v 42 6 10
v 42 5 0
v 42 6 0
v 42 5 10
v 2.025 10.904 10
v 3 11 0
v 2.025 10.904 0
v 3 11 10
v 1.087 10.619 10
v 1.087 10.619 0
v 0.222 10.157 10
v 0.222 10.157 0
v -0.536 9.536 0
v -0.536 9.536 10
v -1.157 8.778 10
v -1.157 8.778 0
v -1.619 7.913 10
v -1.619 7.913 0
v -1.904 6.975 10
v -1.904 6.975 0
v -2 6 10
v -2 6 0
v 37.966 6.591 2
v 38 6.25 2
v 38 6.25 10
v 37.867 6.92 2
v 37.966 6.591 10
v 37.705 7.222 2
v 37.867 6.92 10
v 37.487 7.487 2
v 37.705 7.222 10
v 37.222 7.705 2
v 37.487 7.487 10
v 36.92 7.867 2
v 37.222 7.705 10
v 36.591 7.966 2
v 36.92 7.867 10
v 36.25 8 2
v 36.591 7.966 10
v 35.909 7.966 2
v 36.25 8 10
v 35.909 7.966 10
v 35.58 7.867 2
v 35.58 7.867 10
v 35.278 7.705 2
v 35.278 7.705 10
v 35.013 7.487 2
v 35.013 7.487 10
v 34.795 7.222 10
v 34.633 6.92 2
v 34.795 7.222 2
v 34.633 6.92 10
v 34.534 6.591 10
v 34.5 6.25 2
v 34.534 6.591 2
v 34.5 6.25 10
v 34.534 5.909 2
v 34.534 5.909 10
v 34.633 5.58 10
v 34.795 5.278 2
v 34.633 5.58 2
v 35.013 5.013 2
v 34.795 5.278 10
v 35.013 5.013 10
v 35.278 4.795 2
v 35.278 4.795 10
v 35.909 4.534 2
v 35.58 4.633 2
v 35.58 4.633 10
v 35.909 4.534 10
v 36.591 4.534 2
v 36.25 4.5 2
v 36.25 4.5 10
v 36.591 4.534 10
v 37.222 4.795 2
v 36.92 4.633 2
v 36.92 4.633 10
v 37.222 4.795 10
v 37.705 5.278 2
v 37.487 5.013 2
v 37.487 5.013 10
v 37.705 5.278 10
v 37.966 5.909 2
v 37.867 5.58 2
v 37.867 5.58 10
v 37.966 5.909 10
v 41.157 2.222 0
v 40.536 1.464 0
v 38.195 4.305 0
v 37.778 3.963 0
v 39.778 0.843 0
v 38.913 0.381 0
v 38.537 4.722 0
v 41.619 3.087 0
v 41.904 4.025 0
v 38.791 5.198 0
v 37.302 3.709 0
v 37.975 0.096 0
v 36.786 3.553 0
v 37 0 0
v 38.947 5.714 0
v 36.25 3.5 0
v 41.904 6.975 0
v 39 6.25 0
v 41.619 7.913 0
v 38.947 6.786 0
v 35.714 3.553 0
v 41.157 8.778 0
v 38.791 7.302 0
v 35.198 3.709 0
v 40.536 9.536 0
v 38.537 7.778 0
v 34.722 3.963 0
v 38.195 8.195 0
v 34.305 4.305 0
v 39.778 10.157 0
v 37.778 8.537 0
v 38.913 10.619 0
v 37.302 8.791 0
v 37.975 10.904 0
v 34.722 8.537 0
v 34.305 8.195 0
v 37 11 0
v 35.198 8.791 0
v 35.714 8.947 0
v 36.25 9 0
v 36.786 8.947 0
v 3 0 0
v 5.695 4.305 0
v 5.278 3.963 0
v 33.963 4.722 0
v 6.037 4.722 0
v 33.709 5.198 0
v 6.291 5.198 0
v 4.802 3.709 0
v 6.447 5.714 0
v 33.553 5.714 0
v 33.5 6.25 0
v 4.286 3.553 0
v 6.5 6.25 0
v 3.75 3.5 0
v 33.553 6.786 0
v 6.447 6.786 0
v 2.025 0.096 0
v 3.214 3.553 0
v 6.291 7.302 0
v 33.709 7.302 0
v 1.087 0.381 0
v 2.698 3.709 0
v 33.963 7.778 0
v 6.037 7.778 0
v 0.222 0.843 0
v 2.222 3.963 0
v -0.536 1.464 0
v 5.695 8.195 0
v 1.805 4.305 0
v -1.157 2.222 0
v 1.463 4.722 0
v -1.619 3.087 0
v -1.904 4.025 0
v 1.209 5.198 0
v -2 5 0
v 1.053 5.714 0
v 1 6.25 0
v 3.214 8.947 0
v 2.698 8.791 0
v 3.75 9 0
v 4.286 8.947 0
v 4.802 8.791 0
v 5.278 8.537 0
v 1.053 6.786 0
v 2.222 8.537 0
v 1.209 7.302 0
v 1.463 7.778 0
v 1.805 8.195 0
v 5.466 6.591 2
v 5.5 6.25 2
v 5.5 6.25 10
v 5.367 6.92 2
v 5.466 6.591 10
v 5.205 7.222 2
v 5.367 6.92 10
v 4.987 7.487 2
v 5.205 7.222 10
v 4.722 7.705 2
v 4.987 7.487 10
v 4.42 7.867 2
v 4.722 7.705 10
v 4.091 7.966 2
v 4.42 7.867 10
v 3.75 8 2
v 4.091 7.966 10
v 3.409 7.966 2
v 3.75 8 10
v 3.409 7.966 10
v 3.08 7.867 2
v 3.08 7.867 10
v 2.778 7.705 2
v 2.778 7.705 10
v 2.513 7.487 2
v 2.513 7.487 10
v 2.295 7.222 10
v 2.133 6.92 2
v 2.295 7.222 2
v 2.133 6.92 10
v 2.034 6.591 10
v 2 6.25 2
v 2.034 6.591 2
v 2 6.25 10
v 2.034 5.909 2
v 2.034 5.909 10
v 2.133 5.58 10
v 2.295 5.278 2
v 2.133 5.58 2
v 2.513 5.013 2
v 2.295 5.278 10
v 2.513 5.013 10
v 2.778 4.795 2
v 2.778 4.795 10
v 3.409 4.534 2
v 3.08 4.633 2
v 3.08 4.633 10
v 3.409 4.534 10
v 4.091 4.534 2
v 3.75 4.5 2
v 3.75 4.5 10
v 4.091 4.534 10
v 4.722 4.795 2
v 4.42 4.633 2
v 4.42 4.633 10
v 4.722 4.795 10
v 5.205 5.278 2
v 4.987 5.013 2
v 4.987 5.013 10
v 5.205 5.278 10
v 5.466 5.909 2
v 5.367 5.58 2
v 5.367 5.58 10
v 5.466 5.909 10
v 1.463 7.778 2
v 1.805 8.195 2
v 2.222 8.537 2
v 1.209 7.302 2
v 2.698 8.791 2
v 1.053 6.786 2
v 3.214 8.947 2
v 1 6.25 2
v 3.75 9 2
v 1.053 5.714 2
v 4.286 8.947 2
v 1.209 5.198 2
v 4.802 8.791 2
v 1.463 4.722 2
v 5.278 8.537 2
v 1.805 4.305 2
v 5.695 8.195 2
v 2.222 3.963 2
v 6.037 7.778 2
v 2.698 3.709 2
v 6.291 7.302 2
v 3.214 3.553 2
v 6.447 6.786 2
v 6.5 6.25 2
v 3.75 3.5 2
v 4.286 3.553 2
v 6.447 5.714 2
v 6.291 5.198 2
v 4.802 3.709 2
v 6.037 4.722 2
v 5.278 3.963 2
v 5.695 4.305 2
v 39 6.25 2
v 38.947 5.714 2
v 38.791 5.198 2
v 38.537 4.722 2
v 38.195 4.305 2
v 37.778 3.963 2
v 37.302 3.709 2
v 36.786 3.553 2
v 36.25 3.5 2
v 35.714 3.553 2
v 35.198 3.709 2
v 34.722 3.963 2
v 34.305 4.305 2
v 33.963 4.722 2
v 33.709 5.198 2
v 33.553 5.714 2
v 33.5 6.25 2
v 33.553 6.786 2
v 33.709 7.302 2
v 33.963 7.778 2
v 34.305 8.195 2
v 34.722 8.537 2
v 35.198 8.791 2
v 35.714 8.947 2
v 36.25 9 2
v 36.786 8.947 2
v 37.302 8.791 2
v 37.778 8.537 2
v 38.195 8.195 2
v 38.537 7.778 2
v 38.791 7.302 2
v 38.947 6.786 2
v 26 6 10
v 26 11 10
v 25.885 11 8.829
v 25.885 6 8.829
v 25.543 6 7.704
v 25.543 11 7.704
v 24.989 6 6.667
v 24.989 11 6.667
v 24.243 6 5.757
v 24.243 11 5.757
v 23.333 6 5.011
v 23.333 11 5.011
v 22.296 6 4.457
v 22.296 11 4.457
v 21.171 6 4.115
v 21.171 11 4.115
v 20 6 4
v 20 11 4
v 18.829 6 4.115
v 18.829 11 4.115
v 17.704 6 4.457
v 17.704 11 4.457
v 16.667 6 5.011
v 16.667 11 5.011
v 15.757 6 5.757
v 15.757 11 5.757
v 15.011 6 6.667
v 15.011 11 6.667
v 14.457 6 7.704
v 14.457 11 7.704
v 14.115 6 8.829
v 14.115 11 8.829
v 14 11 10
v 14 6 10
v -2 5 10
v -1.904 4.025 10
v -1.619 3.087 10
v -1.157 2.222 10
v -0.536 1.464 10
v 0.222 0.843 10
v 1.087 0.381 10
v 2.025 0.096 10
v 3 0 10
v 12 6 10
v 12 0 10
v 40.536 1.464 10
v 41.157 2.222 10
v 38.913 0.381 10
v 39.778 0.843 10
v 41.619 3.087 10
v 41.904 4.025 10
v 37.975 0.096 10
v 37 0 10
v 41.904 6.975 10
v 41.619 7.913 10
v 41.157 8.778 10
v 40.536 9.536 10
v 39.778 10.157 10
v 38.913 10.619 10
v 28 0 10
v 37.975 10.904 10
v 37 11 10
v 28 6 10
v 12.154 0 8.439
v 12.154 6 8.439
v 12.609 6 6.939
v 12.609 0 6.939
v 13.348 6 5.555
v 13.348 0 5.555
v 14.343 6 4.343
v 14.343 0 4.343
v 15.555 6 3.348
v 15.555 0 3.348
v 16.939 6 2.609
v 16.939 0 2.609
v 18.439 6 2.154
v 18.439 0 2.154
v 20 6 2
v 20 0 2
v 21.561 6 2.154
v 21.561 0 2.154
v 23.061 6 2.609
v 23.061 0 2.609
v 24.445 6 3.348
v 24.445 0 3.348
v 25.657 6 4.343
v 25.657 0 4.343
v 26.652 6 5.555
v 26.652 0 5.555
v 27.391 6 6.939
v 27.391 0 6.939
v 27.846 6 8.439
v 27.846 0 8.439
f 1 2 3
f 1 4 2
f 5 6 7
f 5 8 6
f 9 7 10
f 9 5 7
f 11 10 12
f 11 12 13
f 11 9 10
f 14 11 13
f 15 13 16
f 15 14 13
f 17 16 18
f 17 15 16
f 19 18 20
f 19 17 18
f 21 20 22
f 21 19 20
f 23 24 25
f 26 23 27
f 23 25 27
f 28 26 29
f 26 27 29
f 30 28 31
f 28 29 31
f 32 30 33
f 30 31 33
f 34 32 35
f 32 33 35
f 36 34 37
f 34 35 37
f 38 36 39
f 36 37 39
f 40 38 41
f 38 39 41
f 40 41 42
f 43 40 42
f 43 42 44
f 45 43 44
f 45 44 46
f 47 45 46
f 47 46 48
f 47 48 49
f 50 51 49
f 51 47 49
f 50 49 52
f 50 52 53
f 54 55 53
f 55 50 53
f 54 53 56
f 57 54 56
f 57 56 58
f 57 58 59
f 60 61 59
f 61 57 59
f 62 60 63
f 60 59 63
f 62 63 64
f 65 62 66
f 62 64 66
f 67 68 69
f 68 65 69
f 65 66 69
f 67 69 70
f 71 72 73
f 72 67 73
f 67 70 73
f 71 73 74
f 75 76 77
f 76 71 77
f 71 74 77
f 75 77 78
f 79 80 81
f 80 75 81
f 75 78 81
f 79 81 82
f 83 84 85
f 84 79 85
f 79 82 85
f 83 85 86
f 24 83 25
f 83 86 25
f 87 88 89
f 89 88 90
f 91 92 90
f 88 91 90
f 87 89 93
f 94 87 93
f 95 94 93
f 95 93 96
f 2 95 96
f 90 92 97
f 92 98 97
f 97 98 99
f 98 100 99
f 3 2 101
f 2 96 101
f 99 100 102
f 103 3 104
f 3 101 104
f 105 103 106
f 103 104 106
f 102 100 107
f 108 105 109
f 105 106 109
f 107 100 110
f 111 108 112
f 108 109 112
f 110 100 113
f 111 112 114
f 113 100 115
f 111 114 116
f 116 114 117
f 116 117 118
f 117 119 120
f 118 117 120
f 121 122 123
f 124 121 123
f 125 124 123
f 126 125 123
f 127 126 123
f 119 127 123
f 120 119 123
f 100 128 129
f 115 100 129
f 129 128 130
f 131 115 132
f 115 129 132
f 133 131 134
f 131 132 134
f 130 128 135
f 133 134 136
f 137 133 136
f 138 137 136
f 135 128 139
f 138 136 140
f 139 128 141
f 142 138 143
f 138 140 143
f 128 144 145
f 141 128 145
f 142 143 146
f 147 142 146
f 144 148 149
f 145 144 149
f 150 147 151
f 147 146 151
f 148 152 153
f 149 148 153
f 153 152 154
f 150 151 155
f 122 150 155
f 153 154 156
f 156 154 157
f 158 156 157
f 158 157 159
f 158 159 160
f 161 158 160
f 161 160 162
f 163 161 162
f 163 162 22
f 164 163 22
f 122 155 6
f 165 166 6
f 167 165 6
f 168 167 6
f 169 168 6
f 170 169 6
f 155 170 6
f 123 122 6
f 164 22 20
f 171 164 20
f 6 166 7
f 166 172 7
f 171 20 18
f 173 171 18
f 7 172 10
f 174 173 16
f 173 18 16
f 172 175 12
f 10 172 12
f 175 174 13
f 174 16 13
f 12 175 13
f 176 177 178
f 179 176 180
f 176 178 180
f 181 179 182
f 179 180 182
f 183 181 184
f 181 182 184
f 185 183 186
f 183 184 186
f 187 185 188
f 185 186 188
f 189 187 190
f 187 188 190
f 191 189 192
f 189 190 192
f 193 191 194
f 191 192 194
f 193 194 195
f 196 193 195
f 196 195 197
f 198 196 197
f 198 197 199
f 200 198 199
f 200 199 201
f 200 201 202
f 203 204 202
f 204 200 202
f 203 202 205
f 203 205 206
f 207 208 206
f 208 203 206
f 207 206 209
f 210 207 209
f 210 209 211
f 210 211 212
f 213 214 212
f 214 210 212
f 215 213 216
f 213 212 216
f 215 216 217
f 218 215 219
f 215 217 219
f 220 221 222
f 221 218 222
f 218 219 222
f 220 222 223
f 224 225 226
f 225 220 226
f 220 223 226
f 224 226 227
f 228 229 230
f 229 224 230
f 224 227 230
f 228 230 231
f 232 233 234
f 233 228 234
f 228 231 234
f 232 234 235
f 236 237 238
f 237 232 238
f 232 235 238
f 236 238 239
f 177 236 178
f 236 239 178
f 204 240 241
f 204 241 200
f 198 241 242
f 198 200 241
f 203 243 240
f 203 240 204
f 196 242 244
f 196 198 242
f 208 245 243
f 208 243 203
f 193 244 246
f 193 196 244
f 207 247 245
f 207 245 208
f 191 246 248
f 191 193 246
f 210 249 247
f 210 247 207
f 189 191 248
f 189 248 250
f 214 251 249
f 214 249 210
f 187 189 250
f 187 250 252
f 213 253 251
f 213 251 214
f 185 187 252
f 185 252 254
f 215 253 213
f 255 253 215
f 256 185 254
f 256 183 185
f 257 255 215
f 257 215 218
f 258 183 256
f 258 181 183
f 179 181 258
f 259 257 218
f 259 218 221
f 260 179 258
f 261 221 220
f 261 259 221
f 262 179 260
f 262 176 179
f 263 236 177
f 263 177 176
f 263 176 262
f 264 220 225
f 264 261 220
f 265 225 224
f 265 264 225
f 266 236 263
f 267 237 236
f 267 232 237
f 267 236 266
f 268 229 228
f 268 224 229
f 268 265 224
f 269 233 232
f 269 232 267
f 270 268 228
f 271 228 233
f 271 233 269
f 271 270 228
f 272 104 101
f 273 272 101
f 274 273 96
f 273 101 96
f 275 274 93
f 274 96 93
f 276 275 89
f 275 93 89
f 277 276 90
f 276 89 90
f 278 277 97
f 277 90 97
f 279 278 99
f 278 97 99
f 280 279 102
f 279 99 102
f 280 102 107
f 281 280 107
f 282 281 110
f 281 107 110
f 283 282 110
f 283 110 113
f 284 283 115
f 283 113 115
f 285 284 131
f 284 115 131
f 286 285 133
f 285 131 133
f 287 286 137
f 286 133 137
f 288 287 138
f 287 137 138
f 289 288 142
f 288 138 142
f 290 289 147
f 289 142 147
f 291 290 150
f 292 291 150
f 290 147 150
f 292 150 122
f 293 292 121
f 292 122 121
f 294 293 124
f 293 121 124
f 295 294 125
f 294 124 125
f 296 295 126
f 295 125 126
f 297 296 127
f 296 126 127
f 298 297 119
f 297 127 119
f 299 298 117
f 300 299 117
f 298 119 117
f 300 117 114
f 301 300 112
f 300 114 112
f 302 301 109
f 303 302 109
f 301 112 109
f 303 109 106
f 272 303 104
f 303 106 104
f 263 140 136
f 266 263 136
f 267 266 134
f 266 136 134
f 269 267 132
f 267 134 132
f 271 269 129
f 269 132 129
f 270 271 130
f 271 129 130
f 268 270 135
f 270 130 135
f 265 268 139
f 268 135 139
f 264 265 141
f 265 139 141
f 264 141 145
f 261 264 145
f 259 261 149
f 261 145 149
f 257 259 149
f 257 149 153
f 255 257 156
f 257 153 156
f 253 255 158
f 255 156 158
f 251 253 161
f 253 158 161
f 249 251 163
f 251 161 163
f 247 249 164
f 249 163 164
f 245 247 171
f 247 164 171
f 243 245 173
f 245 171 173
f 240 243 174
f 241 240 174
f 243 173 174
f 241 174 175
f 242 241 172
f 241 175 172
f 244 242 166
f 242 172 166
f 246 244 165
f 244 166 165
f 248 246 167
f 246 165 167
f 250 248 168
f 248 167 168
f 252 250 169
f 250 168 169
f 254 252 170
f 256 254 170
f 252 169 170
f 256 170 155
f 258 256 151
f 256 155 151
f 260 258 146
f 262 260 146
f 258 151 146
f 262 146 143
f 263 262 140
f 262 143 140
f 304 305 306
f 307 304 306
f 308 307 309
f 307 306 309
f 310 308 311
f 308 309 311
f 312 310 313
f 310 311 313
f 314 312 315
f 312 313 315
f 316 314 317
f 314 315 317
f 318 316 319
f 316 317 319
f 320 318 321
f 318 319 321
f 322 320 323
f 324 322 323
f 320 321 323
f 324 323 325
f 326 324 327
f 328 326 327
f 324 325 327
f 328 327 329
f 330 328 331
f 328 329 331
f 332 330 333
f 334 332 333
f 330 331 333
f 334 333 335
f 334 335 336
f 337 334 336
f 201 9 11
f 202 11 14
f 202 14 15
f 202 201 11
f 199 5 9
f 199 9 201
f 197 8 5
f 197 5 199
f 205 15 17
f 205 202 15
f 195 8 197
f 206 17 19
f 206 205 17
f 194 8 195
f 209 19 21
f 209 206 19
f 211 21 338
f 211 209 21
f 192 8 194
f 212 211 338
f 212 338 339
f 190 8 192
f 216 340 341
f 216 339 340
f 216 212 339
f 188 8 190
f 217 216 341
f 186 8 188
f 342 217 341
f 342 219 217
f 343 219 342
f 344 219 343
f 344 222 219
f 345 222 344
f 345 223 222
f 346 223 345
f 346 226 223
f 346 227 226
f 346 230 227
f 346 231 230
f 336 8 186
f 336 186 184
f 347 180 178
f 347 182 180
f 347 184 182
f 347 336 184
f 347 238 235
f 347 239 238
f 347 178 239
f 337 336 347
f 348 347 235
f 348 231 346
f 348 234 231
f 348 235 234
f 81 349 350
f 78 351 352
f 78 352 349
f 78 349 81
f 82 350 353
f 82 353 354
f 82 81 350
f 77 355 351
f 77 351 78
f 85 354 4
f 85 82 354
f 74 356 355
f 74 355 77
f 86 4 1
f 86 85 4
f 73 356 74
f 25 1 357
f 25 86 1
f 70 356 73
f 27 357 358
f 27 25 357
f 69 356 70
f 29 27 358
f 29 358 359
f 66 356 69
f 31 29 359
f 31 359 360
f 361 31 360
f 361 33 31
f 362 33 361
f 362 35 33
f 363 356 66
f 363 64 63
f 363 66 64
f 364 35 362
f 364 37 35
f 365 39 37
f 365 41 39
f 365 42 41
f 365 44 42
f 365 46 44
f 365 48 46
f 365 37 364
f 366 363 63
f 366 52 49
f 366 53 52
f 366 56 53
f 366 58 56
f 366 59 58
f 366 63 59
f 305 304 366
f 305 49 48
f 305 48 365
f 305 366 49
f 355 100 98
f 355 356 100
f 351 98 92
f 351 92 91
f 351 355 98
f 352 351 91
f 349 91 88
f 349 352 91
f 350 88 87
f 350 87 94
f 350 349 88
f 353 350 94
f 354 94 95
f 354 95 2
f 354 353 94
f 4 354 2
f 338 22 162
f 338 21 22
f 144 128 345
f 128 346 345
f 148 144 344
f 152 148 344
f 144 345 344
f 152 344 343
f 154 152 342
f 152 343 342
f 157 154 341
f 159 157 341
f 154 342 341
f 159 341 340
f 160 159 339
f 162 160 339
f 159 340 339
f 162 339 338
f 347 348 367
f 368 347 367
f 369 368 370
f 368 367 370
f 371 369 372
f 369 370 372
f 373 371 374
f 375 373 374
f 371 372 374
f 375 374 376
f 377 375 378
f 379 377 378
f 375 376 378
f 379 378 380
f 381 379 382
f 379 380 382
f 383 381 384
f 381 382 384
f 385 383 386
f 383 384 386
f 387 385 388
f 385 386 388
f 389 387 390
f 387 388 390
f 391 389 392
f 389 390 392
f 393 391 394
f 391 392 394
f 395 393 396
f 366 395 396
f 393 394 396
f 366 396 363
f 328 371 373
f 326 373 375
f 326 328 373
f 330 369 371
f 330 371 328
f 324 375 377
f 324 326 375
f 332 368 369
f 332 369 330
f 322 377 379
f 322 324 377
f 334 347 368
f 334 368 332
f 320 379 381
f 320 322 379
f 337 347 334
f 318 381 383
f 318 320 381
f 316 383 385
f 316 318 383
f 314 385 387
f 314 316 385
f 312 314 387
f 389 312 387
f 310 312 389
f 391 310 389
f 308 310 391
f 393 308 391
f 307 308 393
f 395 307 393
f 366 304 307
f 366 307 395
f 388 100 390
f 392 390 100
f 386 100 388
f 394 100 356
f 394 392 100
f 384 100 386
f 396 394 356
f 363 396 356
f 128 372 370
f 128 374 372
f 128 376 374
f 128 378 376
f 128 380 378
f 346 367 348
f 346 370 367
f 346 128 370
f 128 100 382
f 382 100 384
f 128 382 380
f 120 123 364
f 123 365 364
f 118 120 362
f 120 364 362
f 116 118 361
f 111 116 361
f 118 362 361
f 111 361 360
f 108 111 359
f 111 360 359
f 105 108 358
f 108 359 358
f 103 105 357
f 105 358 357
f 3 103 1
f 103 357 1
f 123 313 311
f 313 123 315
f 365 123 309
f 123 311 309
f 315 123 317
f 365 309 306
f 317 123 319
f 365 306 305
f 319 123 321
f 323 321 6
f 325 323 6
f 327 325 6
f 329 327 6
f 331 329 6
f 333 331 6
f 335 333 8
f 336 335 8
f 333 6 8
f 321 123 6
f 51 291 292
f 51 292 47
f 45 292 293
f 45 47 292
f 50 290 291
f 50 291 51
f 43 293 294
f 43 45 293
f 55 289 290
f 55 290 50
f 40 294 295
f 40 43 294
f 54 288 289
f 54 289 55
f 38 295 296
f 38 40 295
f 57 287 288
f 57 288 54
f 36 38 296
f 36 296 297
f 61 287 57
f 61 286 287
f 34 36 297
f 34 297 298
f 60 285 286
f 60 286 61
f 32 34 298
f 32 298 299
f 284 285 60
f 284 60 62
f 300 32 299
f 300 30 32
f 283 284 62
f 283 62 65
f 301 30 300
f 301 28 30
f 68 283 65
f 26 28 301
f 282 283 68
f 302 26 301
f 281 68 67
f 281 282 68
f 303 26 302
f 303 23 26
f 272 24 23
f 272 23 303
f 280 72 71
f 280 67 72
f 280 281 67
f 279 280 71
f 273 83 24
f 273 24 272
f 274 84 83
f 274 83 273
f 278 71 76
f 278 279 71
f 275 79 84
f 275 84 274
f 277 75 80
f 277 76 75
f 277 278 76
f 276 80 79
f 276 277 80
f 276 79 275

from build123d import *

# Parameters (mm, degrees)
F0_W      = 40
F0_H      = 11
F1_DEPTH  = 10
F2_R      = 8
F3_DEPTH  = 6
F4_R      = 6
F5_DEPTH  = 6
F6_W      = 11
F6_H      = 10
F7_DEPTH  = 2
F8_W      = 11
F8_H      = 10
F9_DEPTH  = 2
F10_R     = 5
F11_R     = 1.75
F12_DEPTH = 25
F13_R     = 2.75
F13_R_2   = 1.75
F14_DEPTH = 2


with BuildPart() as f1:
    # F0 (on Top) → F1 (new body)
    with BuildSketch(Plane.XY):
        with Locations((20, 5.5)):
            Rectangle(F0_W, F0_H)
    extrude(amount=F1_DEPTH)

    # F2 (on face) → F3 (cut)
    with BuildSketch(Plane.XZ):
        with Locations((20, 10)):
            Circle(F2_R)
    extrude(amount=-F3_DEPTH, mode=Mode.SUBTRACT)

    # F4 (on face) → F5 (cut)
    with BuildSketch(Plane(origin=(0, 11, 0), x_dir=(-1, 0, 0), z_dir=(0, 1, 0))):
        with Locations((-20, 10)):
            Circle(F4_R)
    extrude(amount=-F5_DEPTH, mode=Mode.SUBTRACT)

    # F6 (on face) → F7 (join)
    with BuildSketch(Plane(origin=(0, 0, 0), x_dir=(0, -1, 0), z_dir=(-1, 0, 0))):
        with Locations((-5.5, 5)):
            Rectangle(F6_W, F6_H)
    extrude(amount=F7_DEPTH)

    # F8 (on face) → F9 (join)
    with BuildSketch(Plane.YZ.offset(40)):
        with Locations((5.5, 5)):
            Rectangle(F8_W, F8_H)
    extrude(amount=F9_DEPTH)

    # F10
    f10_edges = [f1.edges().sort_by_distance(p)[0] for p in [
        (42, 11, 5),
        (42, 0, 5),
        (-2, 11, 5),
        (-2, 0, 5),
    ]]
    fillet(f10_edges, radius=F10_R)

    # F11 (on face) → F12 (cut)
    with BuildSketch(Plane.XY.offset(10)):
        with Locations((3.75, 6.25)):
            Circle(F11_R)
        with Locations((36.25, 6.25)):
            Circle(F11_R)
    extrude(amount=-F12_DEPTH, mode=Mode.SUBTRACT)

    # F13 (on face) → F14 (cut)
    with BuildSketch(Plane(origin=(0, 0, 0), x_dir=(1, 0, 0), z_dir=(0, 0, -1))):
        with Locations((3.75, -6.25)):
            Circle(F13_R)
        with Locations((3.75, -6.25)):
            Circle(F13_R_2, mode=Mode.SUBTRACT)
        with Locations((36.25, -6.25)):
            Circle(F13_R)
        with Locations((36.25, -6.25)):
            Circle(F13_R_2, mode=Mode.SUBTRACT)
    extrude(amount=-F14_DEPTH, mode=Mode.SUBTRACT)


solid = f1.part
